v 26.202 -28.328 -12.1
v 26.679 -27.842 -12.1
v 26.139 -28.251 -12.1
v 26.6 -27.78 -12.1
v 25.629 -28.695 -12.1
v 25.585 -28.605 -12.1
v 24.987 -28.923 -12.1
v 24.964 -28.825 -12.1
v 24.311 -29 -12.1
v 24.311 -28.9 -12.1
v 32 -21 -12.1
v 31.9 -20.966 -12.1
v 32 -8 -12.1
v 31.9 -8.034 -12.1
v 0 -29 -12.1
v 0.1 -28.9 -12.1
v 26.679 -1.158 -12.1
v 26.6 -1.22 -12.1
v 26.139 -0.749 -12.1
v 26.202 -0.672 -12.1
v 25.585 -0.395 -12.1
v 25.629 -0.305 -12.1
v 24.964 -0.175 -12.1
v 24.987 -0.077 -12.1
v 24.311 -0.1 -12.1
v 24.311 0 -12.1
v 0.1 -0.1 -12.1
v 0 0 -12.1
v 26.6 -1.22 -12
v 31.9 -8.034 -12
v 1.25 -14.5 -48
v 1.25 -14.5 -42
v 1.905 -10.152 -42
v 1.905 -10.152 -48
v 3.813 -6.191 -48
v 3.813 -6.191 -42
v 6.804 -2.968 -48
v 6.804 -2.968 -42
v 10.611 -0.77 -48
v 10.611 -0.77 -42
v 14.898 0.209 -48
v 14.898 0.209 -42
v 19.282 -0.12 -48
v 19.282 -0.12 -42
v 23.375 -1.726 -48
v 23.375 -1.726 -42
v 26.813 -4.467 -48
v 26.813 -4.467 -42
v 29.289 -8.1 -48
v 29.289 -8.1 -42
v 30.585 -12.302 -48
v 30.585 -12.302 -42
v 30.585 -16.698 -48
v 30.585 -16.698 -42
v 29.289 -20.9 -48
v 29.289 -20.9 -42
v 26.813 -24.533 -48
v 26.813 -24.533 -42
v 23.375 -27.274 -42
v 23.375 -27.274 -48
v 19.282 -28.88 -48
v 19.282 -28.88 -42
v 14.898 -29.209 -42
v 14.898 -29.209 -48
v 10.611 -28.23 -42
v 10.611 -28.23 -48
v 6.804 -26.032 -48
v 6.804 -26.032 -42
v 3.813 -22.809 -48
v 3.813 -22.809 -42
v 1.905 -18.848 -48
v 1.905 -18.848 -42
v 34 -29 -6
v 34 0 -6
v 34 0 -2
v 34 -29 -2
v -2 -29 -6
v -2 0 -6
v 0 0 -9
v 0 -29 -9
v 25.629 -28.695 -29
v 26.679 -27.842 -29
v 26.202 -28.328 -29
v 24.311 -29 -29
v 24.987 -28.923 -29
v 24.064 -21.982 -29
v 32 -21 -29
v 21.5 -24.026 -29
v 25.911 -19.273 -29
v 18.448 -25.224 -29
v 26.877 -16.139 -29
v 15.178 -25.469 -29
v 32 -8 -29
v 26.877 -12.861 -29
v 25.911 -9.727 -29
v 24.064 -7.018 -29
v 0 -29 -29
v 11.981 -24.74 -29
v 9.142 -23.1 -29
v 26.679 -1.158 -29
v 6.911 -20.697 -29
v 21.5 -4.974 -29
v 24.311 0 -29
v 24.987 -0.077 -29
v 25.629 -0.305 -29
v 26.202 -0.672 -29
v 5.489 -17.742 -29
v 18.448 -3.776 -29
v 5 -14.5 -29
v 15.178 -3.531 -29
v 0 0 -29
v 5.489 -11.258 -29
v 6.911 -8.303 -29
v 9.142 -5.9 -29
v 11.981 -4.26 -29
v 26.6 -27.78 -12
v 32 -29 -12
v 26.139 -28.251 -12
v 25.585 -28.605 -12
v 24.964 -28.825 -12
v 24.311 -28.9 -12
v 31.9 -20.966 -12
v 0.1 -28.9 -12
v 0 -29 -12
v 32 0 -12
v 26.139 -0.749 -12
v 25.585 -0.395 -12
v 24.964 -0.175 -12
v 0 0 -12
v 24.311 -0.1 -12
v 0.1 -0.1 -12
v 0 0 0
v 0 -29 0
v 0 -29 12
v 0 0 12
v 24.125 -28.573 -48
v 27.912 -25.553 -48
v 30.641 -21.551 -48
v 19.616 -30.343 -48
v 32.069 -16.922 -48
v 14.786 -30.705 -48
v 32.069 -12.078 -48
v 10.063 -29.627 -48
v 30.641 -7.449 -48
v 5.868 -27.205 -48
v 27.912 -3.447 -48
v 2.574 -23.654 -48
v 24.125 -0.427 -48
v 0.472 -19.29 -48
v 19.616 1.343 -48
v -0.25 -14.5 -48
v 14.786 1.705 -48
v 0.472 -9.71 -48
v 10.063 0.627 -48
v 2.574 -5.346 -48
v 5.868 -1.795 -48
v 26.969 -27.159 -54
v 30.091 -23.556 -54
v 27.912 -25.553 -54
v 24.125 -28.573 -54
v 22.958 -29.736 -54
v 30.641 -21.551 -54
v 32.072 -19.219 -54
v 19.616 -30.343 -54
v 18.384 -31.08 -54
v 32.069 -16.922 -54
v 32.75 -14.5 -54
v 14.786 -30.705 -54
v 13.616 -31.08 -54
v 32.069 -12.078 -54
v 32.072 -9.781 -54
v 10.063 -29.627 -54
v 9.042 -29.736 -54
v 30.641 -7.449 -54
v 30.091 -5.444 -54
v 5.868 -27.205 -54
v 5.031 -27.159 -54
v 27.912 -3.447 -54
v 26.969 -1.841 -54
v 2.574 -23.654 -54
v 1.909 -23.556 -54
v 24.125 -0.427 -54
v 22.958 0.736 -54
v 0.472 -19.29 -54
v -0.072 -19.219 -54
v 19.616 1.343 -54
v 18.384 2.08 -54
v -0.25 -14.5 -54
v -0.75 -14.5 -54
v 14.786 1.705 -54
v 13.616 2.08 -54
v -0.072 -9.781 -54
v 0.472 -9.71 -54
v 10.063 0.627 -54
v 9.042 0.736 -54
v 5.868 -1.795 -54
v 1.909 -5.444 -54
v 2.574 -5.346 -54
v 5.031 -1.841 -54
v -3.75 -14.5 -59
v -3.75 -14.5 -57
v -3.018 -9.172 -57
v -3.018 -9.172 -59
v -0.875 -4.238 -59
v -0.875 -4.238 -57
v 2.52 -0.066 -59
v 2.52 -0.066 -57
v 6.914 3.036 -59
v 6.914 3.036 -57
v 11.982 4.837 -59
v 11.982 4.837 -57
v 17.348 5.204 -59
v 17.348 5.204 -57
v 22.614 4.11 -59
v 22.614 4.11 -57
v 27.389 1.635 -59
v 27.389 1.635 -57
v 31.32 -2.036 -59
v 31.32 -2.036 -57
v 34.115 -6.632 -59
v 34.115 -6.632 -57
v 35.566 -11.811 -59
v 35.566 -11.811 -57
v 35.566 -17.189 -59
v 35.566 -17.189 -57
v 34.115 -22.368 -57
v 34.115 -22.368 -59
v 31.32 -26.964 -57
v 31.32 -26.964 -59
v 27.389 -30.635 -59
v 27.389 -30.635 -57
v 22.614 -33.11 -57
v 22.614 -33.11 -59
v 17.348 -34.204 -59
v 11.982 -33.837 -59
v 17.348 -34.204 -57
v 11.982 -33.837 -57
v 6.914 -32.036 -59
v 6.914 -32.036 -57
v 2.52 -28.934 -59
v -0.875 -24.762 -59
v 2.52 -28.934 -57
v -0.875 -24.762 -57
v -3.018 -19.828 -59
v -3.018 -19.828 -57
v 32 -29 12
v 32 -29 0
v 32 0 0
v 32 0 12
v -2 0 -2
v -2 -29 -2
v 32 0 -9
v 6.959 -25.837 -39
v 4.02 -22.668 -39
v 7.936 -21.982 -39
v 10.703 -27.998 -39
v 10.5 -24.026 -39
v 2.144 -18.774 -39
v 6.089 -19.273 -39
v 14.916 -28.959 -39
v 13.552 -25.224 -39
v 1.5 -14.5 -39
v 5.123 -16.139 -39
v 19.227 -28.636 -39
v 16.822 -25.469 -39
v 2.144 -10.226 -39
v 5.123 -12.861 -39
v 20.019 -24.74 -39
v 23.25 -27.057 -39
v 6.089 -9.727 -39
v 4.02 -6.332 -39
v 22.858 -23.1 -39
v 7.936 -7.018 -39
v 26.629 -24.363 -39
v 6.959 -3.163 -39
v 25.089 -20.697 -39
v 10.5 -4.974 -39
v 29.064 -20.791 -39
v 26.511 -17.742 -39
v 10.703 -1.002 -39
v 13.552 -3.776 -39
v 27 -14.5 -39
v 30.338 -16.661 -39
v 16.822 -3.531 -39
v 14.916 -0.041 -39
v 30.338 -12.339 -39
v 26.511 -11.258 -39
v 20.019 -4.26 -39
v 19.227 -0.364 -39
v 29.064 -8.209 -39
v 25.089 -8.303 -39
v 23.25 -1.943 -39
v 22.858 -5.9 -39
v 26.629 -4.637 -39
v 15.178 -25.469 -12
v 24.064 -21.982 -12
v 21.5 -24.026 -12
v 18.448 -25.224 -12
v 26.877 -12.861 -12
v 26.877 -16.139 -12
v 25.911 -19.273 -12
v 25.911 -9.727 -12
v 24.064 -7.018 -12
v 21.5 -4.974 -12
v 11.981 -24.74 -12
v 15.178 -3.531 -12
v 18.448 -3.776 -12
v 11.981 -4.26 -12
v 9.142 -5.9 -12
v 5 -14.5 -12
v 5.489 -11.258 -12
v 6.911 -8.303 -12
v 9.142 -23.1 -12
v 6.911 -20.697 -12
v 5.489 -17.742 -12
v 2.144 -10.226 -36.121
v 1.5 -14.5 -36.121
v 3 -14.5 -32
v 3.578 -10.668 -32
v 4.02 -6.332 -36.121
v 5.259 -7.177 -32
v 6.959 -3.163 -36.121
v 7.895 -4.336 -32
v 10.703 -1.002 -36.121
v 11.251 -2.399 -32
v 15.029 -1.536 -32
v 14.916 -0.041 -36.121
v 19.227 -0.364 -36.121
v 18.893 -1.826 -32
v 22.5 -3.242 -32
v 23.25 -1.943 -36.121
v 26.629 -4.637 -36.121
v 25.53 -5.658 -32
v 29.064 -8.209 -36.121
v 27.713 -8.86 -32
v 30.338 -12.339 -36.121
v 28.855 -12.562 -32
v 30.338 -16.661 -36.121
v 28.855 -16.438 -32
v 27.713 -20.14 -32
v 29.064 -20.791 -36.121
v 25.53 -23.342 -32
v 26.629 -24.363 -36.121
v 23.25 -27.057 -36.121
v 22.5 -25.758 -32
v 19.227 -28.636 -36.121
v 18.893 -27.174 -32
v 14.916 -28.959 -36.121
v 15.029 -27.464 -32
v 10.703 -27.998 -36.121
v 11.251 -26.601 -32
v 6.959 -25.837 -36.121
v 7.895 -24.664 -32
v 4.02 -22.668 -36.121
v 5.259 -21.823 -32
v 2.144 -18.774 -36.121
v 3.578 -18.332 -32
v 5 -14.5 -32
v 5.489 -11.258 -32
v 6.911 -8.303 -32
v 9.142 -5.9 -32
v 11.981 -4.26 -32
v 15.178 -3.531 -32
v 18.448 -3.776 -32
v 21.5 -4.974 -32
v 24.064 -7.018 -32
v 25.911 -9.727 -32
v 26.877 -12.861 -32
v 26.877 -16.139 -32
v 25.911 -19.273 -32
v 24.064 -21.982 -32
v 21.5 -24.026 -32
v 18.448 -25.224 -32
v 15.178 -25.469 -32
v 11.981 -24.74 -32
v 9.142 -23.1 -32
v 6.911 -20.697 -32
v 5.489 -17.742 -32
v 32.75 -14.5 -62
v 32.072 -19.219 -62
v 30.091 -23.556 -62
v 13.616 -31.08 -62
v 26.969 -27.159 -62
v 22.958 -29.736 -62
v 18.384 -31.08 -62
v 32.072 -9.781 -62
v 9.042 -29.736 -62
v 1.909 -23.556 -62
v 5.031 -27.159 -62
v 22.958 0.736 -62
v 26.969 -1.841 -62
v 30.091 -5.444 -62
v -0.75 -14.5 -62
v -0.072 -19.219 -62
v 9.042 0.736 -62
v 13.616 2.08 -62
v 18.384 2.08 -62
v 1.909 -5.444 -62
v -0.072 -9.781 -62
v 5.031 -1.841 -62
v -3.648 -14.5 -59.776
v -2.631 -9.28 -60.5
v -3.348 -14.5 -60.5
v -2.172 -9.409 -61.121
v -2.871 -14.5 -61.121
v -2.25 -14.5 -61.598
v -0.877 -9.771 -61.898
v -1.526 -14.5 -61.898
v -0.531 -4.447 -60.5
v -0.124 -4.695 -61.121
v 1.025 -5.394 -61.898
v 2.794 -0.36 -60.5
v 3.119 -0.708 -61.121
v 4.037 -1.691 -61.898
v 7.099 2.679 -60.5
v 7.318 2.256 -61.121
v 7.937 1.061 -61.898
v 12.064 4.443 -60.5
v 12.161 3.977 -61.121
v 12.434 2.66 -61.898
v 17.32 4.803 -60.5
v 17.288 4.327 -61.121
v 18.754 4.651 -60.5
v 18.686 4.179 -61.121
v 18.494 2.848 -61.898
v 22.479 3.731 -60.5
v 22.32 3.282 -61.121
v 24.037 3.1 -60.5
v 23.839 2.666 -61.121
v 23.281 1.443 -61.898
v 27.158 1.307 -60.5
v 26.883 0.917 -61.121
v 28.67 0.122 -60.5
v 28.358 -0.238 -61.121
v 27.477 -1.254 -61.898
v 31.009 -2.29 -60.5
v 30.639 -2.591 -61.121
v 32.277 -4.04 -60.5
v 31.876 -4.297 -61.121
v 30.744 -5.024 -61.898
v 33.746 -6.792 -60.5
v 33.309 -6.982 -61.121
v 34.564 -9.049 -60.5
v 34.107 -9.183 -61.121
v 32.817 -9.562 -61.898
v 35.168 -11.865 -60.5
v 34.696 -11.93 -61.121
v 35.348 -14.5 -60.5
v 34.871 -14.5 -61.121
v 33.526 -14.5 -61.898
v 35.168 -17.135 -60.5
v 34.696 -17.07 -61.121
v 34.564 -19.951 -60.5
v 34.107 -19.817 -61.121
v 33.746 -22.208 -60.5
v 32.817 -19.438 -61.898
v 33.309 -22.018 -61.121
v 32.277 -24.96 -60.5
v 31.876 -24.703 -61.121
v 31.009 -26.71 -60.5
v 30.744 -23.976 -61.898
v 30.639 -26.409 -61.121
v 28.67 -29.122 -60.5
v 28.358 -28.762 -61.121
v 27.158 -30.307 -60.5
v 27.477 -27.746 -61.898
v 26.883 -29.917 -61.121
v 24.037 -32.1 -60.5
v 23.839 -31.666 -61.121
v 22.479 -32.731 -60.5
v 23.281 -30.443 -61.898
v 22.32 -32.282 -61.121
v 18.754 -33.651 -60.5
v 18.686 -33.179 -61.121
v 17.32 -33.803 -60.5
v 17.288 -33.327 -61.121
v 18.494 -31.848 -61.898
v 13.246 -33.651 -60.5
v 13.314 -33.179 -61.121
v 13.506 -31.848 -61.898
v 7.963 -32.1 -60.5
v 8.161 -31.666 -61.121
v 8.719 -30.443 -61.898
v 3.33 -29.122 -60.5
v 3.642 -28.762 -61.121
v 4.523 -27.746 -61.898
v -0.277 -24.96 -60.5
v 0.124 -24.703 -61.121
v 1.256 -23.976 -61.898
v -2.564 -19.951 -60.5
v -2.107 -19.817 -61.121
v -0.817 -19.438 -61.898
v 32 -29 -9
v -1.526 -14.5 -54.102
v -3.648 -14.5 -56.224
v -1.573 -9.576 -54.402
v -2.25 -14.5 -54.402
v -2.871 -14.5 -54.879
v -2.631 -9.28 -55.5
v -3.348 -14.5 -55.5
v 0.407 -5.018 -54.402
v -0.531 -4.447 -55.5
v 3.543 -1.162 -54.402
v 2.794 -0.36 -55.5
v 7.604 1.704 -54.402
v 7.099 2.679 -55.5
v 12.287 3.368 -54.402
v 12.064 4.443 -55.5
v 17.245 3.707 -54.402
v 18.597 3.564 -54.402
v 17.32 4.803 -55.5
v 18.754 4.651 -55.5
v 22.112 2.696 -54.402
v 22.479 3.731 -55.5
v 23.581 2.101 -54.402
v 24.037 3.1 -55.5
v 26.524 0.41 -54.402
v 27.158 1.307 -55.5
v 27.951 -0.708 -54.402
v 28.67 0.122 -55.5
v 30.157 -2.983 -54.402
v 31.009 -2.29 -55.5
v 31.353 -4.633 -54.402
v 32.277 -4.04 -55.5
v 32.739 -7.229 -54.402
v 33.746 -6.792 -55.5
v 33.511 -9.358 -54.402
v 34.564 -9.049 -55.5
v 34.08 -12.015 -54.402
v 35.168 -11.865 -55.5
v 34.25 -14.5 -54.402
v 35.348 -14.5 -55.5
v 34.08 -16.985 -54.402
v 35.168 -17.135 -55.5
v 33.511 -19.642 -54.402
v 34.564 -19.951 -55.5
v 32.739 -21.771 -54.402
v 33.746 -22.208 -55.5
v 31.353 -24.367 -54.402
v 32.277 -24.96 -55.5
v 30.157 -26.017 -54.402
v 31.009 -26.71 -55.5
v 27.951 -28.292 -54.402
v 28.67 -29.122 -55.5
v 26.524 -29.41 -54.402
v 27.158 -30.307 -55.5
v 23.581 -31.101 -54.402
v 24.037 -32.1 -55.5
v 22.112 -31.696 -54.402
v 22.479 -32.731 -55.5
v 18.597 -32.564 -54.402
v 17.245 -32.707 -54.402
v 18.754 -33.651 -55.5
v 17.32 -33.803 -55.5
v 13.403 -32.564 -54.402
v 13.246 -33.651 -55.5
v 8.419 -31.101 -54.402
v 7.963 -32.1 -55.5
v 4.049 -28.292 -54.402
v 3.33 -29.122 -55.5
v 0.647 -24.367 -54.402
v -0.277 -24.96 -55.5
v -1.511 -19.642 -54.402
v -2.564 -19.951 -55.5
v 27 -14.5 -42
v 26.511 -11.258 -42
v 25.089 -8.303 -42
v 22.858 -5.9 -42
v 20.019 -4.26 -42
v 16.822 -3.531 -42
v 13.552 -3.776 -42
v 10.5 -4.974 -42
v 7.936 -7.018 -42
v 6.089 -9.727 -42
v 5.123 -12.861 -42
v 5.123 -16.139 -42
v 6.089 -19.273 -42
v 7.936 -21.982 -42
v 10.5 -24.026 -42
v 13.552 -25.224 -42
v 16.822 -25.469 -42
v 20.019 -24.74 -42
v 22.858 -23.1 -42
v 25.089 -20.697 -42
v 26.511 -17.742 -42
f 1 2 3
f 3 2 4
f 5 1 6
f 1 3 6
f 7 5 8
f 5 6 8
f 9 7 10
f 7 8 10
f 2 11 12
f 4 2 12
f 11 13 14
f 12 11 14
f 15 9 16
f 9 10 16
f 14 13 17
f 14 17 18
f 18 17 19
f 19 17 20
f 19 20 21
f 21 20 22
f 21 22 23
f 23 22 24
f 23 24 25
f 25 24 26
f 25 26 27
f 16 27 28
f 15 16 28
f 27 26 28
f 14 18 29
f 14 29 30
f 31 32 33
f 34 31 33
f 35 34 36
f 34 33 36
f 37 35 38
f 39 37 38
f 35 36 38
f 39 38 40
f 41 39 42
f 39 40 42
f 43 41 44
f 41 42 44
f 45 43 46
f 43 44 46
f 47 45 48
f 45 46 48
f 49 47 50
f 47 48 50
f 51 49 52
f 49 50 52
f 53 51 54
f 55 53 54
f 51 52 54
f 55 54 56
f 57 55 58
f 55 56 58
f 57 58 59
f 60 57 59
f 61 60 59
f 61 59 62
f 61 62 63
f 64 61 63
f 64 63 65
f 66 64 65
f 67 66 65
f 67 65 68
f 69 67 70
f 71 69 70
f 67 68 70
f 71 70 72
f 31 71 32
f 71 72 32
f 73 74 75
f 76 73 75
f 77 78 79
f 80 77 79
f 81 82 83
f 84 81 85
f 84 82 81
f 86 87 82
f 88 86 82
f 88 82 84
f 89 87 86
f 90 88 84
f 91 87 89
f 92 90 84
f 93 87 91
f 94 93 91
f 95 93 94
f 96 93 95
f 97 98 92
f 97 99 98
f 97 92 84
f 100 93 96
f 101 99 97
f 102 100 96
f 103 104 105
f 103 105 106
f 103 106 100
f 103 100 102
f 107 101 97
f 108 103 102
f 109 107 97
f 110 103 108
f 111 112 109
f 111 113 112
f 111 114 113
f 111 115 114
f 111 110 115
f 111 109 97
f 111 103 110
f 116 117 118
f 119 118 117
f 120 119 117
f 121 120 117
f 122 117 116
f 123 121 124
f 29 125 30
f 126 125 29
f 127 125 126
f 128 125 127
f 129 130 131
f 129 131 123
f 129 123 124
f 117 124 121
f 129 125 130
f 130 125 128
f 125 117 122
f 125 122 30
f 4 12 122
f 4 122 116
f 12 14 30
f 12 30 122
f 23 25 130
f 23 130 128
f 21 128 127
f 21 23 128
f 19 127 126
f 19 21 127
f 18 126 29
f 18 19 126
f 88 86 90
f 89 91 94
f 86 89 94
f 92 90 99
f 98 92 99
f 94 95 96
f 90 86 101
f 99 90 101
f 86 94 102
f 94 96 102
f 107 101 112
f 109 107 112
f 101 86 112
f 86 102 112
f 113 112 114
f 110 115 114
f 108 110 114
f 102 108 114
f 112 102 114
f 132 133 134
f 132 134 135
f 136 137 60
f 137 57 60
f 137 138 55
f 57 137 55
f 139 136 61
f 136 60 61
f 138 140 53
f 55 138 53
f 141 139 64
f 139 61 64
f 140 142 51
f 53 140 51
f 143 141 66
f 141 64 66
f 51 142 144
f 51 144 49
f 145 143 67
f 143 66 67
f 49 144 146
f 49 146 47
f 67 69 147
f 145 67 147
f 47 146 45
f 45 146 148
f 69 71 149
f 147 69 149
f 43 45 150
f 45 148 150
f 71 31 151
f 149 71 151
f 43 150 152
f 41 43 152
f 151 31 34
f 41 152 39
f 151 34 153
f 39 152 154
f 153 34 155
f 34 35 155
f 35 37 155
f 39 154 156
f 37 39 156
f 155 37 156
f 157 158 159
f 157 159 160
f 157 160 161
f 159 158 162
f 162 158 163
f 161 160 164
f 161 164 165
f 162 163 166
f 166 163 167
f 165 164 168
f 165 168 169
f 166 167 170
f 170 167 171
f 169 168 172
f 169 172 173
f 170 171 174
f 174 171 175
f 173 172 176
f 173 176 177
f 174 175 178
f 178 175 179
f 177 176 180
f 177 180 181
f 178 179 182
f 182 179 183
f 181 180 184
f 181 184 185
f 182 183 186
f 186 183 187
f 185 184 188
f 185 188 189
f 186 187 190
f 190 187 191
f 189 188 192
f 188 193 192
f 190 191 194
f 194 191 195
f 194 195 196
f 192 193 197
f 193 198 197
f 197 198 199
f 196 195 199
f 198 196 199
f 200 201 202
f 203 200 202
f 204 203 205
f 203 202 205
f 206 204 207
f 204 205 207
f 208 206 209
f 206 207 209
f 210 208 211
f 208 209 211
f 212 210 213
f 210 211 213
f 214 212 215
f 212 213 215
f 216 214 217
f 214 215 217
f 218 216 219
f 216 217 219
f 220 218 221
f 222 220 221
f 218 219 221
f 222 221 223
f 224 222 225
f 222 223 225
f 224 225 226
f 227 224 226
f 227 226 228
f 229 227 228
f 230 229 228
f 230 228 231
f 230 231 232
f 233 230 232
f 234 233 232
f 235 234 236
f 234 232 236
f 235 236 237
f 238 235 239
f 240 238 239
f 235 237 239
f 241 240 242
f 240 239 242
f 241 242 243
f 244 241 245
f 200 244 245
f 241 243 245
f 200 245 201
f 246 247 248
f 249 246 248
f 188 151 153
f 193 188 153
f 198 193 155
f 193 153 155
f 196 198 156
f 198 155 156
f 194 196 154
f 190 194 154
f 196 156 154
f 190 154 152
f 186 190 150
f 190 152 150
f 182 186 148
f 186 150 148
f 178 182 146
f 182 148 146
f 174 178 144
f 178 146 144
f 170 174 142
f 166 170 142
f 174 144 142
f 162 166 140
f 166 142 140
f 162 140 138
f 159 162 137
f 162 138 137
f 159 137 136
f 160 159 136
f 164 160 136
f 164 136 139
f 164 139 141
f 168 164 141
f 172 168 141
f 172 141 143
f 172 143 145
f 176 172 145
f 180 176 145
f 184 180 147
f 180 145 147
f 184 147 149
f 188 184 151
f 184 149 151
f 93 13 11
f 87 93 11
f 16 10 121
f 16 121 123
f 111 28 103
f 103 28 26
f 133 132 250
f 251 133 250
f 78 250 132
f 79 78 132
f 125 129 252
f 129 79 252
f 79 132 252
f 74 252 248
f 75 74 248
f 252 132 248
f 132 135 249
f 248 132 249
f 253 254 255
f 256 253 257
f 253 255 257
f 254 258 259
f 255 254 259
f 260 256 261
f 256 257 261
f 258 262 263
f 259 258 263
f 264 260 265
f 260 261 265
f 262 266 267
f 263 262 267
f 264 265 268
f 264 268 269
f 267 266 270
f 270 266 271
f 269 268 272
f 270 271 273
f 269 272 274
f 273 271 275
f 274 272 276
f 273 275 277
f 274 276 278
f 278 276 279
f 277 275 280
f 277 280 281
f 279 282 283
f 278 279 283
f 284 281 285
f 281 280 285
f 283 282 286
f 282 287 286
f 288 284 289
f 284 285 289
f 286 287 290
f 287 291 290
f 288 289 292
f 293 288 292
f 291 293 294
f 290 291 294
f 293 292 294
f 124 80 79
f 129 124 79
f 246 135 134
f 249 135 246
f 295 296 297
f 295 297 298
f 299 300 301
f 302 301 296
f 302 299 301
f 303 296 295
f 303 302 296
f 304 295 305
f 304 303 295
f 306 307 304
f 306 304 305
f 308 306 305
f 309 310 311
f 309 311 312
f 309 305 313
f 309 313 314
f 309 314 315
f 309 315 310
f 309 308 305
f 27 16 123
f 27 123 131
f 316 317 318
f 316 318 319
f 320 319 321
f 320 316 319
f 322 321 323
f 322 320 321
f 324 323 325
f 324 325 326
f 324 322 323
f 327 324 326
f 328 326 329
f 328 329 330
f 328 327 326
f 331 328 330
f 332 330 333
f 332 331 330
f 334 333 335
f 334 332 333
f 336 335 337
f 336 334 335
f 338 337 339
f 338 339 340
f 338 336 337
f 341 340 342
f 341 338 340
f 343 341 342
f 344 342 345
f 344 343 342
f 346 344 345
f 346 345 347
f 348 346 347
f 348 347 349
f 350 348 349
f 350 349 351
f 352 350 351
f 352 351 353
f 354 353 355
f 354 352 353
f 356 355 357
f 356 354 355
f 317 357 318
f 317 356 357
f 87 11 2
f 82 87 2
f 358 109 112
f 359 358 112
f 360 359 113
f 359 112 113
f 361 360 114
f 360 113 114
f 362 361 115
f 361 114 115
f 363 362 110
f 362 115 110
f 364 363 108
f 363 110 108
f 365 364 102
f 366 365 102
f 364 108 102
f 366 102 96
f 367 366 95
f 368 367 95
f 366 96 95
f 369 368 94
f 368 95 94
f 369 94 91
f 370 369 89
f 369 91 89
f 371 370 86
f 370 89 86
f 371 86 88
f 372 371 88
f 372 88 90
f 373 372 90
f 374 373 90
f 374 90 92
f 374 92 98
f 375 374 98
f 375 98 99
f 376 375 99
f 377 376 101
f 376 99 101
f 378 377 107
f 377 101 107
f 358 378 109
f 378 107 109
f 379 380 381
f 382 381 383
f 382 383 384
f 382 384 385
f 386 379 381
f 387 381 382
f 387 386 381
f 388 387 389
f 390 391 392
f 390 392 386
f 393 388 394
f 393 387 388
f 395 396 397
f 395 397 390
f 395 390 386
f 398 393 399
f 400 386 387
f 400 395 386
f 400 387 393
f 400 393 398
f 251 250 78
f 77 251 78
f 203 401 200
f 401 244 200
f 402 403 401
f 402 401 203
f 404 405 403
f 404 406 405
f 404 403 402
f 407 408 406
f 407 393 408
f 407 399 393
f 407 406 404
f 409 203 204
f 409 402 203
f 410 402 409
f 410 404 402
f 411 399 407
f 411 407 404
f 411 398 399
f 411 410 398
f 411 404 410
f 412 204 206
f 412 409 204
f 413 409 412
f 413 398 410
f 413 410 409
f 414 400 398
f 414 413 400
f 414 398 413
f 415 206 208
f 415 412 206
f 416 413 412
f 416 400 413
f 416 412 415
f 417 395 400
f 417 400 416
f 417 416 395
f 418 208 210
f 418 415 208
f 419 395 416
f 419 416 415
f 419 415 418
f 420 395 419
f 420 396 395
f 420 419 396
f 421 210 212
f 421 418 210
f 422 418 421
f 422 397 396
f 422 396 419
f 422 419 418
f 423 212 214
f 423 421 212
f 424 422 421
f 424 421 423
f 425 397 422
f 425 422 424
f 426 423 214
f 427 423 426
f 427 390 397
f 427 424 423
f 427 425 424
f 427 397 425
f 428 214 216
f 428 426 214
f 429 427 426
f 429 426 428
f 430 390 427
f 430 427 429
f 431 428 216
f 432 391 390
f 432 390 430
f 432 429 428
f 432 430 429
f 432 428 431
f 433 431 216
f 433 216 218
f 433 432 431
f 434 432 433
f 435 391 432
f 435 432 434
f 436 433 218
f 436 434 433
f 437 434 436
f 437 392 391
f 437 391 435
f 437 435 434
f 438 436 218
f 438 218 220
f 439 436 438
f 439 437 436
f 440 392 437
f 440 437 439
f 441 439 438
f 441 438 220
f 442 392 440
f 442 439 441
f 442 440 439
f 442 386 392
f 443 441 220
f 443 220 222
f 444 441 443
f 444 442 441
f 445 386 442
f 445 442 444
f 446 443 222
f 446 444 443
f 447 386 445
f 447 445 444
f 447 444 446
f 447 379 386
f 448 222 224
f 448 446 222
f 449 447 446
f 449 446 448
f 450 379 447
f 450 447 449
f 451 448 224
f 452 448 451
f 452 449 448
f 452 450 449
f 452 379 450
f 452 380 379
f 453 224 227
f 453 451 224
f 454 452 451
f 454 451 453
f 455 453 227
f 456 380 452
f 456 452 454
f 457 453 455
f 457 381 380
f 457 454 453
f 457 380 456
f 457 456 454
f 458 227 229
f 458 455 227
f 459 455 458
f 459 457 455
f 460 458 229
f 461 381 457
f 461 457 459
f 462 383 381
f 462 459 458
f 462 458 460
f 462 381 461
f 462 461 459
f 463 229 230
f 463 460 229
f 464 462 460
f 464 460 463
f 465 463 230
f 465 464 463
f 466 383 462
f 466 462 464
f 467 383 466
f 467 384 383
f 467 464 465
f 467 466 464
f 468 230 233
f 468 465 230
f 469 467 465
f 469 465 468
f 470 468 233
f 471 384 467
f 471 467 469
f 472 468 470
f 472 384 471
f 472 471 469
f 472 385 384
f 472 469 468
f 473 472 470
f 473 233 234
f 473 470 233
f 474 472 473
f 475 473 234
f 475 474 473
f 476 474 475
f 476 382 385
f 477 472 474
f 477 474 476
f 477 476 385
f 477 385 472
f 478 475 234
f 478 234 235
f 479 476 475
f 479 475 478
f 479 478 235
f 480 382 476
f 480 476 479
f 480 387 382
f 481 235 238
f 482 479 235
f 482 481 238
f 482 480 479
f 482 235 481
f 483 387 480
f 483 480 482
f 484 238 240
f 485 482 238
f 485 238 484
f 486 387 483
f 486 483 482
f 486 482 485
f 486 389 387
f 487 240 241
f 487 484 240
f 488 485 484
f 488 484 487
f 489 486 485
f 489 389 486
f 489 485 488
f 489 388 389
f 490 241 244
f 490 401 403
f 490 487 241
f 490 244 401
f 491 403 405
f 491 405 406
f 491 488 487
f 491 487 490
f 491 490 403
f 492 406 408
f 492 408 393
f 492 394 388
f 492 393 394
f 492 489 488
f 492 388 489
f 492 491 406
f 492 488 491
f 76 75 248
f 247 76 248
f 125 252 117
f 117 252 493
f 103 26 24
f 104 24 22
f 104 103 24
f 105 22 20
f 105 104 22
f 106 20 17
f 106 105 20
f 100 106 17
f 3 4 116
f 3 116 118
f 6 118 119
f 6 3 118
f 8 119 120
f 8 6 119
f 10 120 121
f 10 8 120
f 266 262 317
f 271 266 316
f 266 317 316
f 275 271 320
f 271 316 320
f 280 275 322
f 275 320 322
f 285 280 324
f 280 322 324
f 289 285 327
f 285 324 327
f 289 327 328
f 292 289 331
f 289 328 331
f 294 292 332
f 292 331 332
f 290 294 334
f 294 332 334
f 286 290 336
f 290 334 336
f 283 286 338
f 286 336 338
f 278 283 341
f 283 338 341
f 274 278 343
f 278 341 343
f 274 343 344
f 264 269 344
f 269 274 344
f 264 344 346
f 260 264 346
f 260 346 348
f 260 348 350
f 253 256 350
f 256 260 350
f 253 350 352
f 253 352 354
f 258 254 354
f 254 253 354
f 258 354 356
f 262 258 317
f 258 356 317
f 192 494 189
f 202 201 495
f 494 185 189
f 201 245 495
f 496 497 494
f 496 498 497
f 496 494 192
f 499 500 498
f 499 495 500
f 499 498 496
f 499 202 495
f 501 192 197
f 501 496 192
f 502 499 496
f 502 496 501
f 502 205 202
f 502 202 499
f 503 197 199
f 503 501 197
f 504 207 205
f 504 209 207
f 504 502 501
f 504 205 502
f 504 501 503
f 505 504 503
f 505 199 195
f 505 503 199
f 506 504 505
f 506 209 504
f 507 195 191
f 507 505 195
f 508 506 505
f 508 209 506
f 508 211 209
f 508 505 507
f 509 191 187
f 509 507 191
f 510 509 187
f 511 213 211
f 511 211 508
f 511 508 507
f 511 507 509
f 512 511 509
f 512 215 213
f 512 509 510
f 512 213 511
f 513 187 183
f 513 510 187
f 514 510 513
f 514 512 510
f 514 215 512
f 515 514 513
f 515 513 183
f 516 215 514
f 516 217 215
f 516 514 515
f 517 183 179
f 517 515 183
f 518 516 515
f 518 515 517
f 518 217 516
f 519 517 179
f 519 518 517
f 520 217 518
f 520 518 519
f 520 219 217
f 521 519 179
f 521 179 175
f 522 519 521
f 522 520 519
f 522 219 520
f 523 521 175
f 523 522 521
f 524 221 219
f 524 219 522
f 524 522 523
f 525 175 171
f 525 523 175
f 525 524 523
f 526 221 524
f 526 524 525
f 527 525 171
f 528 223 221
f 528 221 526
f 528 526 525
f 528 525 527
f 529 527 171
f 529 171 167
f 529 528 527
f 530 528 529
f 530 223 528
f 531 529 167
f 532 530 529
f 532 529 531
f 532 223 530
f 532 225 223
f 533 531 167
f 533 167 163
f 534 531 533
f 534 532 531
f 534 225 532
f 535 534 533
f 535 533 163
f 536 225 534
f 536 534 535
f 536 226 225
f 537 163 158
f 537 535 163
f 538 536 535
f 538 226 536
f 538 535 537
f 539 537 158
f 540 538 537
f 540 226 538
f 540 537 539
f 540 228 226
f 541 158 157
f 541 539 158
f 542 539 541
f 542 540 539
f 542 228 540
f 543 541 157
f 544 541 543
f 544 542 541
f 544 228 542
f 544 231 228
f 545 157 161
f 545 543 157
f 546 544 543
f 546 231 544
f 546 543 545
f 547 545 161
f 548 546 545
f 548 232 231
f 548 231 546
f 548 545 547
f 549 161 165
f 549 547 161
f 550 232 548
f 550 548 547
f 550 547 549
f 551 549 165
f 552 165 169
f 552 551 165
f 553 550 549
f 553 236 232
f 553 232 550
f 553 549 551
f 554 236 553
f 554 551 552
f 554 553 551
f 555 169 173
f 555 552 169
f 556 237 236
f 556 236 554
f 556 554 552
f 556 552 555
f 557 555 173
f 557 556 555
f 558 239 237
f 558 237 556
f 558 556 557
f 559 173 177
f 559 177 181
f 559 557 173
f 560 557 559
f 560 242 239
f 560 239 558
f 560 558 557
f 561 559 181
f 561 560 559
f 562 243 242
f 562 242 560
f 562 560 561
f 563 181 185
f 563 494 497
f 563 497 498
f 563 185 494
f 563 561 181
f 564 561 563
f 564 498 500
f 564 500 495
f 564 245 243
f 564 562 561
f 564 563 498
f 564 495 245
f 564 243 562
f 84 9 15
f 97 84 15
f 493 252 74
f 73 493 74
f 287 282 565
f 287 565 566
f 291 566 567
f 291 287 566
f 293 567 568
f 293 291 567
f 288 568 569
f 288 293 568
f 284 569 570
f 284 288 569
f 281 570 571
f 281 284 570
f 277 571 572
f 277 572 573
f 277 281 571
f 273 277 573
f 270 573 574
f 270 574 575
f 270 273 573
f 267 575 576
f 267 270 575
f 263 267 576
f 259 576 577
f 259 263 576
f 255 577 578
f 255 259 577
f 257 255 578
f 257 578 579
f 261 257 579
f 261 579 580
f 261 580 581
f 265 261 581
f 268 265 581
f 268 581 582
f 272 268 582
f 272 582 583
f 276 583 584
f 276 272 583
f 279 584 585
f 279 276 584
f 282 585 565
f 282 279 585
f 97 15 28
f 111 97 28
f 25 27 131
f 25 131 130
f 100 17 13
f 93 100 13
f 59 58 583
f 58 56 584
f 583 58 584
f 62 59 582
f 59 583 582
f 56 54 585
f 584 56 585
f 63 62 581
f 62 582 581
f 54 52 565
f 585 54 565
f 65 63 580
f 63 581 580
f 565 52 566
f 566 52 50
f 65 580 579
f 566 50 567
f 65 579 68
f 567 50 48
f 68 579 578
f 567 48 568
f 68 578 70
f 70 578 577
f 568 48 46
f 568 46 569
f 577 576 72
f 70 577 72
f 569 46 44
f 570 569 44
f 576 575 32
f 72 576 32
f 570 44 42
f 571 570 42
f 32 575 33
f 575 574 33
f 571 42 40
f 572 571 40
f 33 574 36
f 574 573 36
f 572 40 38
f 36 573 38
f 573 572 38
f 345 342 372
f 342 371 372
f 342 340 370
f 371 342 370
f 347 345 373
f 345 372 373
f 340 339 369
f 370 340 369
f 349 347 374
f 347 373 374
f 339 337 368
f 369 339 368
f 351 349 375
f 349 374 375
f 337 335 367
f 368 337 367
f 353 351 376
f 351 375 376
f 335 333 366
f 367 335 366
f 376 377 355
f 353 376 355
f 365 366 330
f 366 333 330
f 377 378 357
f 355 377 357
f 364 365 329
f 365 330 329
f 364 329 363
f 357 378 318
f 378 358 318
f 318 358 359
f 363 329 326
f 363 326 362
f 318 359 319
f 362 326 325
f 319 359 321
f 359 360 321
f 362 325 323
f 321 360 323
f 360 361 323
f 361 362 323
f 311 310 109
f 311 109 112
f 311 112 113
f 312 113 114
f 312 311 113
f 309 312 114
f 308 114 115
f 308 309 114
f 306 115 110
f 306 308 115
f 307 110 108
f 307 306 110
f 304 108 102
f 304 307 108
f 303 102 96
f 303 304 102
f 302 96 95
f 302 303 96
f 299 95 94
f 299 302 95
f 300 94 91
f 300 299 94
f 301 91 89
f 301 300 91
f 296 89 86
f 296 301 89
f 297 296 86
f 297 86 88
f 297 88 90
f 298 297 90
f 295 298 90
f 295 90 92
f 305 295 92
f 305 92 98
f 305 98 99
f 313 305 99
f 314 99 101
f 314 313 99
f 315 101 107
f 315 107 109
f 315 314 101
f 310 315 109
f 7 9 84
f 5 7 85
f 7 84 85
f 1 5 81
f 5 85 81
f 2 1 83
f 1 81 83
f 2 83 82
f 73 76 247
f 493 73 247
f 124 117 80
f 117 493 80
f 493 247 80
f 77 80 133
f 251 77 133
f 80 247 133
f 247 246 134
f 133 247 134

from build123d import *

# Parameters (mm, degrees)
SKETCH_1_W          = 32
SKETCH_1_H          = 29
EXTRUDE_1_DEPTH     = 12
EXTRUDE_2_DEPTH     = 29
SKETCH_3_R          = 11
EXTRUDE_3_DEPTH     = 17
SKETCH_4_R          = 11
EXTRUDE_4_DEPTH     = 3
SKETCH_5_R          = 14.5
EXTRUDE_6_DEPTH     = 10
SKETCH_6_R          = 14.75
EXTRUDE_7_DEPTH     = 6
SKETCH_7_R          = 16.25
EXTRUDE_8_DEPTH     = 6
SKETCH_8_R          = 19.75
EXTRUDE_9_DEPTH     = 8
CUT_EXTRUDE_START   = 3
SKETCH_9_R          = 22.553802592
SKETCH_9_R_2        = 11
CUT_EXTRUDE_1_DEPTH = 3
CHAMFER_1_SIZE      = 1.5
CHAMFER_1_SIZE2     = 4.121216129
FILLET_1_R          = 3
FILLET_2_R          = 3
CUT_EXTRUDE_START_2 = 0.1
CUT_EXTRUDE_2_DEPTH = 0.1


with BuildPart() as part:
    # 草图1 → 凸台-拉伸1 (new body)
    with BuildSketch(Plane.XY):
        with Locations((16, -14.5)):
            Rectangle(SKETCH_1_W, SKETCH_1_H)
    extrude(amount=EXTRUDE_1_DEPTH)

    # 草图2 → 凸台-拉伸2 (add)
    with BuildSketch(Plane(origin=(0, 0, 0), x_dir=(1, 0, 0), z_dir=(0, 1, 0))):
        Polygon((0, 0), (-2, 2), (-2, 6), (0, 9), (0, 12), (29.3, 12), (32, 12), (32, 9), (34, 6), (34, 2), (32, 0), align=None)
    extrude(amount=-EXTRUDE_2_DEPTH)

    # 草图3 → 凸台-拉伸3 (add)
    with BuildSketch(Plane(origin=(0, 0, -12), x_dir=(-1, 0, 0), z_dir=(0, 0, -1))):
        Polygon((0, 0), (-25.777777778, 0), (-32, -8), (-32, -21), (-25.777777778, -29), (0, -29), align=None)
        with Locations((-16, -14.5)):
            Circle(SKETCH_3_R, mode=Mode.SUBTRACT)
    extrude(amount=EXTRUDE_3_DEPTH)

    # 圆角2
    fillet_2_edges = [part.edges().sort_by_distance(p)[0] for p in [
        (25.777777778, 0, -20.5),
        (25.777777778, -29, -20.5),
    ]]
    fillet(fillet_2_edges, radius=FILLET_2_R)

    # 草图10 → 切除-拉伸2 (cut)
    with BuildSketch(Plane(origin=(0, 0, -12), x_dir=(-1, 0, 0), z_dir=(0, 0, -1)).offset(CUT_EXTRUDE_START_2)):
        with BuildLine():
            Line((-32, -8), (-32, -21))
            Line((-32, -21), (-26.678583013, -27.841821841))
            ThreePointArc((-26.678583013, -27.841821841), (-25.628580699, -28.694945781), (-24.310526361, -29))
            Line((-24.310526361, -29), (0, -29))
            Line((0, -29), (0, 0))
            Line((0, 0), (-24.310526361, 0))
            ThreePointArc((-24.310526361, 0), (-25.628580699, -0.305054219), (-26.678583013, -1.158178159))
            Line((-26.678583013, -1.158178159), (-32, -8))
        make_face()
        with BuildLine():
            Line((-31.9, -8.034310775), (-31.9, -20.965689225))
            Line((-31.9, -20.965689225), (-26.599647791, -27.780427779))
            ThreePointArc((-26.599647791, -27.780427779), (-25.584645555, -28.605114255), (-24.310526361, -28.9))
            Line((-24.310526361, -28.9), (-0.1, -28.9))
            Line((-0.1, -28.9), (-0.1, -0.1))
            Line((-0.1, -0.1), (-24.310526361, -0.1))
            ThreePointArc((-24.310526361, -0.1), (-25.584645555, -0.394885745), (-26.599647791, -1.219572221))
            Line((-26.599647791, -1.219572221), (-31.9, -8.034310775))
        make_face(mode=Mode.SUBTRACT)
    extrude(amount=-CUT_EXTRUDE_2_DEPTH, mode=Mode.SUBTRACT)


with BuildPart() as body_2:
    # 草图4 → 凸台-拉伸4 (new body)
    with BuildSketch(Plane(origin=(0, 0, -29), x_dir=(-1, 0, 0), z_dir=(0, 0, -1))):
        with Locations((-16, -14.5)):
            Circle(SKETCH_4_R)
    extrude(amount=EXTRUDE_4_DEPTH)

    # 草图5 → 凸台-拉伸6 (add)
    with BuildSketch(Plane(origin=(0, 0, -32), x_dir=(-1, 0, 0), z_dir=(0, 0, -1))):
        with Locations((-16, -14.5)):
            Circle(SKETCH_5_R)
    extrude(amount=EXTRUDE_6_DEPTH)

    # 草图6 → 凸台-拉伸7 (add)
    with BuildSketch(Plane(origin=(0, 0, -42), x_dir=(-1, 0, 0), z_dir=(0, 0, -1))):
        with Locations((-16, -14.5)):
            Circle(SKETCH_6_R)
    extrude(amount=EXTRUDE_7_DEPTH)

    # 草图7 → 凸台-拉伸8 (add)
    with BuildSketch(Plane(origin=(0, 0, -48), x_dir=(-1, 0, 0), z_dir=(0, 0, -1))):
        with Locations((-16, -14.5)):
            Circle(SKETCH_7_R)
    extrude(amount=EXTRUDE_8_DEPTH)

    # 草图8 → 凸台-拉伸9 (add)
    with BuildSketch(Plane(origin=(0, 0, -54), x_dir=(-1, 0, 0), z_dir=(0, 0, -1))):
        with Locations((-16, -14.5)):
            Circle(SKETCH_8_R)
    extrude(amount=EXTRUDE_9_DEPTH)

    # 草图9 → 切除-拉伸1 (cut)
    with BuildSketch(Plane.XY.offset(-42).offset(CUT_EXTRUDE_START)):
        with Locations((16, -14.5)):
            Circle(SKETCH_9_R)
        with Locations((16, -14.5)):
            Circle(SKETCH_9_R_2, mode=Mode.SUBTRACT)
    extrude(amount=-CUT_EXTRUDE_1_DEPTH, mode=Mode.SUBTRACT)

    # 倒角1
    chamfer_1_edges = [body_2.edges().sort_by_distance(p)[0] for p in [
        (30.5, -14.5, -32),
    ]]
    chamfer_1_side = [body_2.faces().sort_by_distance(p)[0] for p in [
        (30.089878067, -14.5, -32),
    ]]
    chamfer(chamfer_1_edges, length=CHAMFER_1_SIZE, length2=CHAMFER_1_SIZE2, reference=chamfer_1_side[0])

    # 圆角1
    fillet_1_edges = [body_2.edges().sort_by_distance(p)[0] for p in [
        (35.75, -14.5, -54),
        (35.75, -14.5, -62),
    ]]
    fillet(fillet_1_edges, radius=FILLET_1_R)


solid = Compound([part.part, body_2.part])
